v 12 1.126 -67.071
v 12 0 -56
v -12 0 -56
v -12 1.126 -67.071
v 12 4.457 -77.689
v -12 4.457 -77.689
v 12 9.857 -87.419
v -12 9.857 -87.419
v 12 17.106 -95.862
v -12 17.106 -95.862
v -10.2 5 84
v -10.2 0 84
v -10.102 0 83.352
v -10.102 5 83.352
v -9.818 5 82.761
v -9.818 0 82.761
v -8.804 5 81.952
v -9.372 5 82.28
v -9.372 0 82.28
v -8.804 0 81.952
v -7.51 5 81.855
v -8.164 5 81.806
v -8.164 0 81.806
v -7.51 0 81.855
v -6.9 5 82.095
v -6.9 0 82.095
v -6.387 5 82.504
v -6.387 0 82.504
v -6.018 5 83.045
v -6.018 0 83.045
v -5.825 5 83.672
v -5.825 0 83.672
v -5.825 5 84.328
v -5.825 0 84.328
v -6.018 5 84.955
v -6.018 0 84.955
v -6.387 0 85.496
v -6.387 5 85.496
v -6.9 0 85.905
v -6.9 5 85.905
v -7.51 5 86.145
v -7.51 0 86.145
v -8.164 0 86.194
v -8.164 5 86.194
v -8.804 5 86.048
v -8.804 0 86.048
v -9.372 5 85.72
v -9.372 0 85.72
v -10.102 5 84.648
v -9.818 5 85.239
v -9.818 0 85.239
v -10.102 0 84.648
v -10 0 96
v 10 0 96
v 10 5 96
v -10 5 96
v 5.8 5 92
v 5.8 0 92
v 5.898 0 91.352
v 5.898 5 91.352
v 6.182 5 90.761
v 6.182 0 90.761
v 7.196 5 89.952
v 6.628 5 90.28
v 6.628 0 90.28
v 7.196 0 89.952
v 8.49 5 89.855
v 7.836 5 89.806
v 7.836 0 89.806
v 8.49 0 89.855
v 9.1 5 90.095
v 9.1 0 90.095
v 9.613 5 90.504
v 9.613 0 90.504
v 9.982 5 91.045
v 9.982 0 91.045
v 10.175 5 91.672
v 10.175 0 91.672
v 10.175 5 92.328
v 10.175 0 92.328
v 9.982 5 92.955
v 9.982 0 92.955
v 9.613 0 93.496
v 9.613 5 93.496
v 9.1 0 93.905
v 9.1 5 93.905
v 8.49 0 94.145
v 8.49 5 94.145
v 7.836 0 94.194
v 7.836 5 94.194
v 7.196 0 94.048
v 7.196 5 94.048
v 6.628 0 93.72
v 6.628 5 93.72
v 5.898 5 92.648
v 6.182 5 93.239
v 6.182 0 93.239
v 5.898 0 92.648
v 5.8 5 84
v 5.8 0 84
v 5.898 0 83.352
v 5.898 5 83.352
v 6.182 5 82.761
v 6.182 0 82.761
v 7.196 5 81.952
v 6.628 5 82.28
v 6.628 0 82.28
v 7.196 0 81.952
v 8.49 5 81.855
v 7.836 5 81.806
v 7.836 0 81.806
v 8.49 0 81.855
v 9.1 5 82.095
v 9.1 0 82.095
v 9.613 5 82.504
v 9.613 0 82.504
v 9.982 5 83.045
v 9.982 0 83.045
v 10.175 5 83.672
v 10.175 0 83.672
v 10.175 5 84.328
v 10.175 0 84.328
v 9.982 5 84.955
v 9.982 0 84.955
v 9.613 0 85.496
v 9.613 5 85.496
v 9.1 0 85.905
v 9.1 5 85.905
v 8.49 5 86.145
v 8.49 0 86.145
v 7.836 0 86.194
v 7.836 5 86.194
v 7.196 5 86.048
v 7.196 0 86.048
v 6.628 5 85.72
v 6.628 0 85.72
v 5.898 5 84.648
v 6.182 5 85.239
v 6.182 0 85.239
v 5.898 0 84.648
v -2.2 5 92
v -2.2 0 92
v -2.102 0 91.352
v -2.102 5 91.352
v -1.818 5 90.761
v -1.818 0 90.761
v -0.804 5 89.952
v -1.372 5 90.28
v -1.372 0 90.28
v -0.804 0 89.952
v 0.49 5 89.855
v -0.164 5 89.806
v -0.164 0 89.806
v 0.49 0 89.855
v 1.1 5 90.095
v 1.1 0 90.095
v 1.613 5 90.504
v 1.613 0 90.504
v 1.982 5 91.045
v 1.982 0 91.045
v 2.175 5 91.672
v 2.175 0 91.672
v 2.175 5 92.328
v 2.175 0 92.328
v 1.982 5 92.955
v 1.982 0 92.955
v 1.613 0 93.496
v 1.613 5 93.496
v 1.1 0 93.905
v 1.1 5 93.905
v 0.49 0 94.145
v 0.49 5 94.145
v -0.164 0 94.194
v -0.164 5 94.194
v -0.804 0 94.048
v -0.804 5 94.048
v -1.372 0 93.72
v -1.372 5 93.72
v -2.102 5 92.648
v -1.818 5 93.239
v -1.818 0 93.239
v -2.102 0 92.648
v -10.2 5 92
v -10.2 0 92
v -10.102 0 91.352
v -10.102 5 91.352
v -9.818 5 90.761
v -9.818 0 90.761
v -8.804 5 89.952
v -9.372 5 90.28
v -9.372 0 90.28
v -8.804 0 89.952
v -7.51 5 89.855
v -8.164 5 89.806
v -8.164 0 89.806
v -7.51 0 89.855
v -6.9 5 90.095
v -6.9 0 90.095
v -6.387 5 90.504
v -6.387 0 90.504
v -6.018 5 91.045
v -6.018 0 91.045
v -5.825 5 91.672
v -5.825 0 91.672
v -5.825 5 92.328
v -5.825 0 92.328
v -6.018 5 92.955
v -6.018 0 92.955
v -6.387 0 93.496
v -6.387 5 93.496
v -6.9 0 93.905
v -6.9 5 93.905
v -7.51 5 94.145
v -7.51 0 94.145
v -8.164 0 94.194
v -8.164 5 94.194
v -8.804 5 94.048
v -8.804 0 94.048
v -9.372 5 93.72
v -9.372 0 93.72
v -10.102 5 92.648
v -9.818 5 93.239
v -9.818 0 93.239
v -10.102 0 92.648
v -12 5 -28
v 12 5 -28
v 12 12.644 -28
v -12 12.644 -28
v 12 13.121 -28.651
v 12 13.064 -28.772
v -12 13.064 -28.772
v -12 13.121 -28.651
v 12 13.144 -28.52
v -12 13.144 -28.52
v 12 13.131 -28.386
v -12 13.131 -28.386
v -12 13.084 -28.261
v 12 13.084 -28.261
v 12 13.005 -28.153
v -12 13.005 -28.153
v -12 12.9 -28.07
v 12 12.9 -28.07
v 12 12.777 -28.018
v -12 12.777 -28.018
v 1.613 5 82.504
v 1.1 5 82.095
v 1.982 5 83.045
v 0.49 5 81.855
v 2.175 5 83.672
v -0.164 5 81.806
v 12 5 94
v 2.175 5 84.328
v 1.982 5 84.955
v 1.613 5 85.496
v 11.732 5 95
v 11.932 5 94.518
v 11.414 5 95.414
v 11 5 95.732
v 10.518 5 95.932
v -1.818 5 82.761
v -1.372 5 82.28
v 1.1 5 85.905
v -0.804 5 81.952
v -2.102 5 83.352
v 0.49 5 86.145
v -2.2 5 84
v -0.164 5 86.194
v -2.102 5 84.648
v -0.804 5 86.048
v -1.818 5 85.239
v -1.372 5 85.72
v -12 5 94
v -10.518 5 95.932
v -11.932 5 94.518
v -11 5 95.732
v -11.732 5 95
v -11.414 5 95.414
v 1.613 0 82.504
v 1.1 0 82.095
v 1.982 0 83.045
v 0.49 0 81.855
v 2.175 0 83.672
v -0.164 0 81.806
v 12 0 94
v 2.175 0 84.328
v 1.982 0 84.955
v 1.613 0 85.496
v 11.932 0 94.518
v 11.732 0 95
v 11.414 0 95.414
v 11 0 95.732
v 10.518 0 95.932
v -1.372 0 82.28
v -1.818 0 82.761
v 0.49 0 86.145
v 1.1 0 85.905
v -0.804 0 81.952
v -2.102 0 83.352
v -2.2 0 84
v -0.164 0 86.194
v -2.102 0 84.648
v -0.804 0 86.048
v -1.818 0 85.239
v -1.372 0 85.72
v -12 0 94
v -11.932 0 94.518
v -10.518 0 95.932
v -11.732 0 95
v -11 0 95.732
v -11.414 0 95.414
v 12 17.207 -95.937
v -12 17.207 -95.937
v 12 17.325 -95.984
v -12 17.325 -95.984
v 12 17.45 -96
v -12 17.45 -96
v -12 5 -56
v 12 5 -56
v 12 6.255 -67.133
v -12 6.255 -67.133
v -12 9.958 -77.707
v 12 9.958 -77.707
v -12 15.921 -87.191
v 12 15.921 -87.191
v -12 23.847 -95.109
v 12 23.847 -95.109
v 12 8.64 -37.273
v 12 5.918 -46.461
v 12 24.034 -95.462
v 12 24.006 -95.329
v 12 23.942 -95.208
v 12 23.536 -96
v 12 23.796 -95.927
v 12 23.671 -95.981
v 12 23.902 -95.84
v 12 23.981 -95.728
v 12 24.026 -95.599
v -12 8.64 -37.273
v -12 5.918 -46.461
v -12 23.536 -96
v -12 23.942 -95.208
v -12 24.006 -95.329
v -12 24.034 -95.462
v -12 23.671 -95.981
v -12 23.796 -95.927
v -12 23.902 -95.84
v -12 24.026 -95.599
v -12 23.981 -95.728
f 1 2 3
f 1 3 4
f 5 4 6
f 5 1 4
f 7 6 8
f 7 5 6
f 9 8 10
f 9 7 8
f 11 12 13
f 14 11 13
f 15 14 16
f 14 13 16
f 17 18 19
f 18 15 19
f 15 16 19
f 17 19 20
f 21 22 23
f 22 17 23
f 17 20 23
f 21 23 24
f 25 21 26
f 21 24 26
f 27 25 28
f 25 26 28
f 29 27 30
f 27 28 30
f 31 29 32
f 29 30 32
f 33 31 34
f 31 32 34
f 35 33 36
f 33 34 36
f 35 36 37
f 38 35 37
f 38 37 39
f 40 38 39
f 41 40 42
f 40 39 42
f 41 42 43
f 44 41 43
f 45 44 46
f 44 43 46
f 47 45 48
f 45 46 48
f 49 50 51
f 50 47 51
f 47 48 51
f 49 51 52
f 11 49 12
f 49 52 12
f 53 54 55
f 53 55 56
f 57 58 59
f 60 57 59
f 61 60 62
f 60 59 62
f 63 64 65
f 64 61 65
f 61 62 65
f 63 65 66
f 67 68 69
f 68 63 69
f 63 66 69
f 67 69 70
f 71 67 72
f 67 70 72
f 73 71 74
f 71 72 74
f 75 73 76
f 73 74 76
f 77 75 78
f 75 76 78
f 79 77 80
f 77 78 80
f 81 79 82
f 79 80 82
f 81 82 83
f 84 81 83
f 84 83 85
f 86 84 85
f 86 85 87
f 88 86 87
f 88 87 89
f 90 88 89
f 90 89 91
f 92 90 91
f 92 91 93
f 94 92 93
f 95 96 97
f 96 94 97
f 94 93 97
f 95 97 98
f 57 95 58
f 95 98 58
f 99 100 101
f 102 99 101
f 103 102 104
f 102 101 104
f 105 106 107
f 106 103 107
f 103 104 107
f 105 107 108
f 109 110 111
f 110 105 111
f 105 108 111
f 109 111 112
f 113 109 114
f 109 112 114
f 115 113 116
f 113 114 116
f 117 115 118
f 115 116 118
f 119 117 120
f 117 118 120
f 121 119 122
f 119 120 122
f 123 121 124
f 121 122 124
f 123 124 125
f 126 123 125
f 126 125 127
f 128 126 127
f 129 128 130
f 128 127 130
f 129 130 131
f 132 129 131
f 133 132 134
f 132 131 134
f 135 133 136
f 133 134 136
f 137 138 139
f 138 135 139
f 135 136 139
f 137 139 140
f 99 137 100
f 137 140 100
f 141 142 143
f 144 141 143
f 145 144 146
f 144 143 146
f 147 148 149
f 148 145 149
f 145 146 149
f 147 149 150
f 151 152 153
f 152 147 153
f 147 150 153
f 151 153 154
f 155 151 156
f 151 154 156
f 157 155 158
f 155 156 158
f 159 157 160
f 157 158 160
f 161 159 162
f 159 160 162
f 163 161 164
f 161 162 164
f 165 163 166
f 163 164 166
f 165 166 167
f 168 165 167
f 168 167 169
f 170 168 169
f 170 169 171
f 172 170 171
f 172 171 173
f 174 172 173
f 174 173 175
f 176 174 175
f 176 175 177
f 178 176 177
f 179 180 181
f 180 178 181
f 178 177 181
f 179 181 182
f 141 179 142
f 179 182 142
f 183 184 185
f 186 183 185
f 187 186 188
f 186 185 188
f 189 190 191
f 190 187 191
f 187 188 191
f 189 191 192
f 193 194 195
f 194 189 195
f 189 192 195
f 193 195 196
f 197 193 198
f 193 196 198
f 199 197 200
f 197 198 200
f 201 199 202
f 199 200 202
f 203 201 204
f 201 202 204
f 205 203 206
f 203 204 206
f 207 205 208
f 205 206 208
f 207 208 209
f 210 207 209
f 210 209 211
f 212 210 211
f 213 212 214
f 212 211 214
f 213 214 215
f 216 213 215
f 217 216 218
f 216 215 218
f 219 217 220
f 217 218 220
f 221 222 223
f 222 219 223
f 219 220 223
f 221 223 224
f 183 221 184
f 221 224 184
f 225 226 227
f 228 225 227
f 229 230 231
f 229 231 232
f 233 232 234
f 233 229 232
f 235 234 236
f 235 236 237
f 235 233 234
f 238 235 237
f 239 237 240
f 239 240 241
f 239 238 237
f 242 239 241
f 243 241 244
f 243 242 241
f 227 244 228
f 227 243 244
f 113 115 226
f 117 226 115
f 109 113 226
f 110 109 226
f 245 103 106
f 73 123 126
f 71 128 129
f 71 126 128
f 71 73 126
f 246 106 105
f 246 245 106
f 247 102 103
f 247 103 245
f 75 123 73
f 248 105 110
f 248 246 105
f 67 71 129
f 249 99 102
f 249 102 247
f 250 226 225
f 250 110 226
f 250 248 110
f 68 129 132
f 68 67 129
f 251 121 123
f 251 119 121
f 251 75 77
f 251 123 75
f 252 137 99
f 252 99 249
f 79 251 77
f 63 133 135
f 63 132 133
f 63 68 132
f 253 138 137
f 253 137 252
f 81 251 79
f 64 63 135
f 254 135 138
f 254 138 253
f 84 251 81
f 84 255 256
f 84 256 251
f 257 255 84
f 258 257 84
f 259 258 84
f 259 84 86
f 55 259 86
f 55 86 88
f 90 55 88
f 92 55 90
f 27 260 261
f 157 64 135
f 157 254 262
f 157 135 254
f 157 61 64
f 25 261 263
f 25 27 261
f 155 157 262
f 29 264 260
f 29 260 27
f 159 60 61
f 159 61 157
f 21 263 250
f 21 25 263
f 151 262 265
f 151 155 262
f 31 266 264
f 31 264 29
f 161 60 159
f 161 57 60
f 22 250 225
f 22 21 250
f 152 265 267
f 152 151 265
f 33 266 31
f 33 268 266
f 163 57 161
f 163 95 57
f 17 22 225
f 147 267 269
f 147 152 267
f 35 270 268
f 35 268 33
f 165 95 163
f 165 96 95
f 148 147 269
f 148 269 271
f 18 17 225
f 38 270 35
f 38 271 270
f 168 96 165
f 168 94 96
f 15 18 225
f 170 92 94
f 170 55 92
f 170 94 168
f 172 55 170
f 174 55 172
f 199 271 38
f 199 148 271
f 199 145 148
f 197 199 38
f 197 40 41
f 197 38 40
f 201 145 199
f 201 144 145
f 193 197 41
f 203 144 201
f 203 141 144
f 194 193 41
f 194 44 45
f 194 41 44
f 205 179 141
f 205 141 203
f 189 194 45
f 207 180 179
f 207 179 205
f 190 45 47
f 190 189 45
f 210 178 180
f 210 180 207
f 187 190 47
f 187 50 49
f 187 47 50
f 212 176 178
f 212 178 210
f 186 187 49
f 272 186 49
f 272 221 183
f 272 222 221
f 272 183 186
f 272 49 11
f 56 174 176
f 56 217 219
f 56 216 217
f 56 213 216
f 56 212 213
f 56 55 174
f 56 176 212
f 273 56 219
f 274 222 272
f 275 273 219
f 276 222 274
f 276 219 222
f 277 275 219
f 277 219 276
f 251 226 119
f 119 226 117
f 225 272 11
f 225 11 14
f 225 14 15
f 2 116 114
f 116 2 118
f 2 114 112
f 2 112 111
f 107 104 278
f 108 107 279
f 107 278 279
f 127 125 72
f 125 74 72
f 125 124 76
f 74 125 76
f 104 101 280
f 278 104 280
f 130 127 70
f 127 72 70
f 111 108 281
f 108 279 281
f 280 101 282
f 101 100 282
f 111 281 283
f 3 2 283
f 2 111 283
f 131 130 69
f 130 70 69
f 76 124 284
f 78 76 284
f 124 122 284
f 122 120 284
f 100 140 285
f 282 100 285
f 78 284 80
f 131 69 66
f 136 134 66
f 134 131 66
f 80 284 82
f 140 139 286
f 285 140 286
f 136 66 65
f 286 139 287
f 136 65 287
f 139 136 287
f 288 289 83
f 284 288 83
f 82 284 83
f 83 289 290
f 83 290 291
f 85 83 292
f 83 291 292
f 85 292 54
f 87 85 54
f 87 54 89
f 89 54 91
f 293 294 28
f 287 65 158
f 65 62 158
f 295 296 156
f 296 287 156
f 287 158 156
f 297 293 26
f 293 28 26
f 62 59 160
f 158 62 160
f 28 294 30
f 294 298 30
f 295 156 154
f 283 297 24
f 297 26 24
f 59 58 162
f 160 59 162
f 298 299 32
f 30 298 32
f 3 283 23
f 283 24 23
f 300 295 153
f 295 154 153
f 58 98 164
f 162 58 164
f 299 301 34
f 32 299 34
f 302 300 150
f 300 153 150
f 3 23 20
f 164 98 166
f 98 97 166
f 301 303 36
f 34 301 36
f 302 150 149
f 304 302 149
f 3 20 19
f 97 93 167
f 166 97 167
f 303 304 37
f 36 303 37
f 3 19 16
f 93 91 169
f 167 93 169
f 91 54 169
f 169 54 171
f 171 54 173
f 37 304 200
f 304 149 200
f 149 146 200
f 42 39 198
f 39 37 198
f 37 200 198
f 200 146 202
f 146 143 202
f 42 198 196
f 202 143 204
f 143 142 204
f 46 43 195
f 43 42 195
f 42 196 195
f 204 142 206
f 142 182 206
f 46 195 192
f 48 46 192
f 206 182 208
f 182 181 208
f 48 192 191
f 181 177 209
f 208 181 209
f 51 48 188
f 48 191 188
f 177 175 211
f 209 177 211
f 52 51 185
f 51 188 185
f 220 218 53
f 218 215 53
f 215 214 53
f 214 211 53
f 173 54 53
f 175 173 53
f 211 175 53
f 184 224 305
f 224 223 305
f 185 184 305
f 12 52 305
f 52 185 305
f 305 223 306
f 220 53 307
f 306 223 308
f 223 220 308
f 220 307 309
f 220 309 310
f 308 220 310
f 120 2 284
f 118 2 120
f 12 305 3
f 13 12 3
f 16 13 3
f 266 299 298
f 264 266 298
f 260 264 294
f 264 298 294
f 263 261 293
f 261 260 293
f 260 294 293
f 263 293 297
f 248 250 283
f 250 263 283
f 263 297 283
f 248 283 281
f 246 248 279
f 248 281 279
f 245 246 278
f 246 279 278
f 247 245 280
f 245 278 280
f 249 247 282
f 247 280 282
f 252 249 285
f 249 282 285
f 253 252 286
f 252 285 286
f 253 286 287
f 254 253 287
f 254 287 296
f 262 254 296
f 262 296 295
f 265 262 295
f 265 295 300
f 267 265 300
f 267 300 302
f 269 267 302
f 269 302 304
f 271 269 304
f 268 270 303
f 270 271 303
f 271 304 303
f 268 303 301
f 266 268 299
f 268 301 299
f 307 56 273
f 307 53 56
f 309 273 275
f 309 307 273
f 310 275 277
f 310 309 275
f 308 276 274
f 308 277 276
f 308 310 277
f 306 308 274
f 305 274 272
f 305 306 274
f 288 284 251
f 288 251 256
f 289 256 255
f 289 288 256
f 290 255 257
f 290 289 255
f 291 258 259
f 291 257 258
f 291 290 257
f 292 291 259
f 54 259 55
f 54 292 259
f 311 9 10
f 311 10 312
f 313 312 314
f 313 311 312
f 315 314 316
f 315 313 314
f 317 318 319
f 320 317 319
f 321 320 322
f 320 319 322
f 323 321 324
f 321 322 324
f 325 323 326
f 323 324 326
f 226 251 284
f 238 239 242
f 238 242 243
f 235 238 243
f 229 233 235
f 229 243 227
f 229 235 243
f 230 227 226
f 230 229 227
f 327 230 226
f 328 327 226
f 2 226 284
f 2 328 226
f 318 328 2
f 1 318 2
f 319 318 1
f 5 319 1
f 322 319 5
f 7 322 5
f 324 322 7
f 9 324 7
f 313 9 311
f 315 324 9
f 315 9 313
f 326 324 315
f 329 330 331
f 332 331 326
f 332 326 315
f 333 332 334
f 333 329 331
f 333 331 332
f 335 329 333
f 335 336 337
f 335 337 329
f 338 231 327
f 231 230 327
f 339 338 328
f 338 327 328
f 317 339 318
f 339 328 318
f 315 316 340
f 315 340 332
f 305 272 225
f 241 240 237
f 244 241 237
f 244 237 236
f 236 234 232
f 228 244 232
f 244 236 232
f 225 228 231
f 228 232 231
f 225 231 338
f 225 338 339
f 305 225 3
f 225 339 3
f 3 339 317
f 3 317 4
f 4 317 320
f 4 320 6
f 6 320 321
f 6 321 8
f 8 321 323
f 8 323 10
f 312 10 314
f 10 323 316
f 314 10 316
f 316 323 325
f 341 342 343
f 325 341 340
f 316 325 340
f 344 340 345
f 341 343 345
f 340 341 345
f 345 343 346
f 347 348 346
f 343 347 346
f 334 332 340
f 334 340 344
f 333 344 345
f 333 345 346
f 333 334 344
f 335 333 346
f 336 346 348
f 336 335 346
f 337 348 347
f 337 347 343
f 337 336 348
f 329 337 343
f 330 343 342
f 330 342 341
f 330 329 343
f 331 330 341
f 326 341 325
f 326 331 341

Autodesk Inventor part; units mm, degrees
ref_plane "YZ Plane" through (0, 0, 0) normal (1, 0, 0) x (0, 1, 0)
ref_plane "XZ Plane" through (0, 0, 0) normal (0, 1, 0) x (-1, 0, 0)
ref_plane "XY Plane" through (0, 0, 0) normal (0, 0, 1) x (1, 0, 0)
sketch "Sketch1" plane through (0, 0, 0) normal (0, 1, 0) x (-1, 0, 0)
  line L0 (-10, 96) -> (10, 96)
  line L1 (12, 94) -> (12, -96)
  line L2 (12, -96) -> (-12, -96)
  line L3 (-12, -96) -> (-12, 94)
  line L4 (-12, 96) -> (12, -96) construction
  line L5 (12, 96) -> (-12, -96) construction
  arc A0 (12, 94) -> (10, 96) centre (10, 94) ccw
  arc A1 (-10, 96) -> (-12, 94) centre (-10, 94) ccw
  circle A2 centre (8, 92) radius 2.2
  circle A3 centre (0, 92) radius 2.2
  circle A4 centre (-8, 92) radius 2.2
  circle A5 centre (8, 84) radius 2.2
  circle A6 centre (0, 84) radius 2.2
  circle A7 centre (-8, 84) radius 2.2
  point P0 (0, 0)
  dimension "d0" = 24
  dimension "d1" = 192
  dimension "d2" = 2
  dimension "d3" = 4.4
  dimension "d4" = 4
  dimension "d5" = 4
  dimension "d8" = 8
  dimension "d11" = 8
extrude "Extrusion1" add sketch "Sketch1" along normal blind 5
sketch "Sketch2" plane through (12, 0, 94) normal (1, 0, 0) x (0, 0, -1)
  arc A0 (150, 5) -> (189.1089, 23.8473) centre (150, 55) ccw
  line L0 (0, 5) -> (190, 5) projected
  line L1 (190, 5) -> (190, 23.5357)
  arc A1 (190, 23.5357) -> (189.1089, 23.8473) centre (189.5, 23.5357) ccw
  point P0 (94, 0)
  point P1 (190, 25)
  dimension "d16" = 100
  dimension "d17" = 40
  dimension "d18" = 0.5
extrude "Extrusion2" add sketch "Sketch2" against normal blind 24
sketch "Sketch3" plane through (12, 0, 94) normal (1, 0, 0) x (0, 0, -1)
  line L0 (0, 0) -> (190, 0) projected
  arc A0 (150, 5) -> (189.1089, 23.8473) centre (150, 55) ccw projected
  line L1 (0, 5) -> (150, 5) projected
  arc A1 (150, 0) -> (189.8624, 17.1055) centre (150, 55) ccw
  line L2 (190, 0) -> (190, 23.5357) projected
  line L3 (190, 17.2508) -> (190, 0)
  line L4 (190, 0) -> (150, 0)
  arc A2 (189.8624, 17.1055) -> (190, 17.45) centre (189.5, 17.45) ccw
  point P0 (150, 0)
  dimension "d27" = 1
  dimension "d28" = 17.2508
extrude "Extrusion3" cut sketch "Sketch3" against normal blind 24
sketch "Sketch4" plane through (12, 0, 94) normal (1, 0, 0) x (0, 0, -1)
  arc A0 (122.7723, 13.0637) -> (150, 5) centre (150, 55) ccw
  line L0 (0, 5) -> (150, 5) projected
  line L1 (190, 17.45) -> (190, 23.5357) projected
  line L2 (122, 5) -> (122, 12.6444)
  arc A1 (122.7723, 13.0637) -> (122, 12.6444) centre (122.5, 12.6444) ccw
  point P0 (94, 0)
  point P1 (122, 13.5754)
  dimension "d31" = 0.5
extrude "Extrusion4" add sketch "Sketch4" against normal blind 24
properties part number "Launcher_Arm_V1"
